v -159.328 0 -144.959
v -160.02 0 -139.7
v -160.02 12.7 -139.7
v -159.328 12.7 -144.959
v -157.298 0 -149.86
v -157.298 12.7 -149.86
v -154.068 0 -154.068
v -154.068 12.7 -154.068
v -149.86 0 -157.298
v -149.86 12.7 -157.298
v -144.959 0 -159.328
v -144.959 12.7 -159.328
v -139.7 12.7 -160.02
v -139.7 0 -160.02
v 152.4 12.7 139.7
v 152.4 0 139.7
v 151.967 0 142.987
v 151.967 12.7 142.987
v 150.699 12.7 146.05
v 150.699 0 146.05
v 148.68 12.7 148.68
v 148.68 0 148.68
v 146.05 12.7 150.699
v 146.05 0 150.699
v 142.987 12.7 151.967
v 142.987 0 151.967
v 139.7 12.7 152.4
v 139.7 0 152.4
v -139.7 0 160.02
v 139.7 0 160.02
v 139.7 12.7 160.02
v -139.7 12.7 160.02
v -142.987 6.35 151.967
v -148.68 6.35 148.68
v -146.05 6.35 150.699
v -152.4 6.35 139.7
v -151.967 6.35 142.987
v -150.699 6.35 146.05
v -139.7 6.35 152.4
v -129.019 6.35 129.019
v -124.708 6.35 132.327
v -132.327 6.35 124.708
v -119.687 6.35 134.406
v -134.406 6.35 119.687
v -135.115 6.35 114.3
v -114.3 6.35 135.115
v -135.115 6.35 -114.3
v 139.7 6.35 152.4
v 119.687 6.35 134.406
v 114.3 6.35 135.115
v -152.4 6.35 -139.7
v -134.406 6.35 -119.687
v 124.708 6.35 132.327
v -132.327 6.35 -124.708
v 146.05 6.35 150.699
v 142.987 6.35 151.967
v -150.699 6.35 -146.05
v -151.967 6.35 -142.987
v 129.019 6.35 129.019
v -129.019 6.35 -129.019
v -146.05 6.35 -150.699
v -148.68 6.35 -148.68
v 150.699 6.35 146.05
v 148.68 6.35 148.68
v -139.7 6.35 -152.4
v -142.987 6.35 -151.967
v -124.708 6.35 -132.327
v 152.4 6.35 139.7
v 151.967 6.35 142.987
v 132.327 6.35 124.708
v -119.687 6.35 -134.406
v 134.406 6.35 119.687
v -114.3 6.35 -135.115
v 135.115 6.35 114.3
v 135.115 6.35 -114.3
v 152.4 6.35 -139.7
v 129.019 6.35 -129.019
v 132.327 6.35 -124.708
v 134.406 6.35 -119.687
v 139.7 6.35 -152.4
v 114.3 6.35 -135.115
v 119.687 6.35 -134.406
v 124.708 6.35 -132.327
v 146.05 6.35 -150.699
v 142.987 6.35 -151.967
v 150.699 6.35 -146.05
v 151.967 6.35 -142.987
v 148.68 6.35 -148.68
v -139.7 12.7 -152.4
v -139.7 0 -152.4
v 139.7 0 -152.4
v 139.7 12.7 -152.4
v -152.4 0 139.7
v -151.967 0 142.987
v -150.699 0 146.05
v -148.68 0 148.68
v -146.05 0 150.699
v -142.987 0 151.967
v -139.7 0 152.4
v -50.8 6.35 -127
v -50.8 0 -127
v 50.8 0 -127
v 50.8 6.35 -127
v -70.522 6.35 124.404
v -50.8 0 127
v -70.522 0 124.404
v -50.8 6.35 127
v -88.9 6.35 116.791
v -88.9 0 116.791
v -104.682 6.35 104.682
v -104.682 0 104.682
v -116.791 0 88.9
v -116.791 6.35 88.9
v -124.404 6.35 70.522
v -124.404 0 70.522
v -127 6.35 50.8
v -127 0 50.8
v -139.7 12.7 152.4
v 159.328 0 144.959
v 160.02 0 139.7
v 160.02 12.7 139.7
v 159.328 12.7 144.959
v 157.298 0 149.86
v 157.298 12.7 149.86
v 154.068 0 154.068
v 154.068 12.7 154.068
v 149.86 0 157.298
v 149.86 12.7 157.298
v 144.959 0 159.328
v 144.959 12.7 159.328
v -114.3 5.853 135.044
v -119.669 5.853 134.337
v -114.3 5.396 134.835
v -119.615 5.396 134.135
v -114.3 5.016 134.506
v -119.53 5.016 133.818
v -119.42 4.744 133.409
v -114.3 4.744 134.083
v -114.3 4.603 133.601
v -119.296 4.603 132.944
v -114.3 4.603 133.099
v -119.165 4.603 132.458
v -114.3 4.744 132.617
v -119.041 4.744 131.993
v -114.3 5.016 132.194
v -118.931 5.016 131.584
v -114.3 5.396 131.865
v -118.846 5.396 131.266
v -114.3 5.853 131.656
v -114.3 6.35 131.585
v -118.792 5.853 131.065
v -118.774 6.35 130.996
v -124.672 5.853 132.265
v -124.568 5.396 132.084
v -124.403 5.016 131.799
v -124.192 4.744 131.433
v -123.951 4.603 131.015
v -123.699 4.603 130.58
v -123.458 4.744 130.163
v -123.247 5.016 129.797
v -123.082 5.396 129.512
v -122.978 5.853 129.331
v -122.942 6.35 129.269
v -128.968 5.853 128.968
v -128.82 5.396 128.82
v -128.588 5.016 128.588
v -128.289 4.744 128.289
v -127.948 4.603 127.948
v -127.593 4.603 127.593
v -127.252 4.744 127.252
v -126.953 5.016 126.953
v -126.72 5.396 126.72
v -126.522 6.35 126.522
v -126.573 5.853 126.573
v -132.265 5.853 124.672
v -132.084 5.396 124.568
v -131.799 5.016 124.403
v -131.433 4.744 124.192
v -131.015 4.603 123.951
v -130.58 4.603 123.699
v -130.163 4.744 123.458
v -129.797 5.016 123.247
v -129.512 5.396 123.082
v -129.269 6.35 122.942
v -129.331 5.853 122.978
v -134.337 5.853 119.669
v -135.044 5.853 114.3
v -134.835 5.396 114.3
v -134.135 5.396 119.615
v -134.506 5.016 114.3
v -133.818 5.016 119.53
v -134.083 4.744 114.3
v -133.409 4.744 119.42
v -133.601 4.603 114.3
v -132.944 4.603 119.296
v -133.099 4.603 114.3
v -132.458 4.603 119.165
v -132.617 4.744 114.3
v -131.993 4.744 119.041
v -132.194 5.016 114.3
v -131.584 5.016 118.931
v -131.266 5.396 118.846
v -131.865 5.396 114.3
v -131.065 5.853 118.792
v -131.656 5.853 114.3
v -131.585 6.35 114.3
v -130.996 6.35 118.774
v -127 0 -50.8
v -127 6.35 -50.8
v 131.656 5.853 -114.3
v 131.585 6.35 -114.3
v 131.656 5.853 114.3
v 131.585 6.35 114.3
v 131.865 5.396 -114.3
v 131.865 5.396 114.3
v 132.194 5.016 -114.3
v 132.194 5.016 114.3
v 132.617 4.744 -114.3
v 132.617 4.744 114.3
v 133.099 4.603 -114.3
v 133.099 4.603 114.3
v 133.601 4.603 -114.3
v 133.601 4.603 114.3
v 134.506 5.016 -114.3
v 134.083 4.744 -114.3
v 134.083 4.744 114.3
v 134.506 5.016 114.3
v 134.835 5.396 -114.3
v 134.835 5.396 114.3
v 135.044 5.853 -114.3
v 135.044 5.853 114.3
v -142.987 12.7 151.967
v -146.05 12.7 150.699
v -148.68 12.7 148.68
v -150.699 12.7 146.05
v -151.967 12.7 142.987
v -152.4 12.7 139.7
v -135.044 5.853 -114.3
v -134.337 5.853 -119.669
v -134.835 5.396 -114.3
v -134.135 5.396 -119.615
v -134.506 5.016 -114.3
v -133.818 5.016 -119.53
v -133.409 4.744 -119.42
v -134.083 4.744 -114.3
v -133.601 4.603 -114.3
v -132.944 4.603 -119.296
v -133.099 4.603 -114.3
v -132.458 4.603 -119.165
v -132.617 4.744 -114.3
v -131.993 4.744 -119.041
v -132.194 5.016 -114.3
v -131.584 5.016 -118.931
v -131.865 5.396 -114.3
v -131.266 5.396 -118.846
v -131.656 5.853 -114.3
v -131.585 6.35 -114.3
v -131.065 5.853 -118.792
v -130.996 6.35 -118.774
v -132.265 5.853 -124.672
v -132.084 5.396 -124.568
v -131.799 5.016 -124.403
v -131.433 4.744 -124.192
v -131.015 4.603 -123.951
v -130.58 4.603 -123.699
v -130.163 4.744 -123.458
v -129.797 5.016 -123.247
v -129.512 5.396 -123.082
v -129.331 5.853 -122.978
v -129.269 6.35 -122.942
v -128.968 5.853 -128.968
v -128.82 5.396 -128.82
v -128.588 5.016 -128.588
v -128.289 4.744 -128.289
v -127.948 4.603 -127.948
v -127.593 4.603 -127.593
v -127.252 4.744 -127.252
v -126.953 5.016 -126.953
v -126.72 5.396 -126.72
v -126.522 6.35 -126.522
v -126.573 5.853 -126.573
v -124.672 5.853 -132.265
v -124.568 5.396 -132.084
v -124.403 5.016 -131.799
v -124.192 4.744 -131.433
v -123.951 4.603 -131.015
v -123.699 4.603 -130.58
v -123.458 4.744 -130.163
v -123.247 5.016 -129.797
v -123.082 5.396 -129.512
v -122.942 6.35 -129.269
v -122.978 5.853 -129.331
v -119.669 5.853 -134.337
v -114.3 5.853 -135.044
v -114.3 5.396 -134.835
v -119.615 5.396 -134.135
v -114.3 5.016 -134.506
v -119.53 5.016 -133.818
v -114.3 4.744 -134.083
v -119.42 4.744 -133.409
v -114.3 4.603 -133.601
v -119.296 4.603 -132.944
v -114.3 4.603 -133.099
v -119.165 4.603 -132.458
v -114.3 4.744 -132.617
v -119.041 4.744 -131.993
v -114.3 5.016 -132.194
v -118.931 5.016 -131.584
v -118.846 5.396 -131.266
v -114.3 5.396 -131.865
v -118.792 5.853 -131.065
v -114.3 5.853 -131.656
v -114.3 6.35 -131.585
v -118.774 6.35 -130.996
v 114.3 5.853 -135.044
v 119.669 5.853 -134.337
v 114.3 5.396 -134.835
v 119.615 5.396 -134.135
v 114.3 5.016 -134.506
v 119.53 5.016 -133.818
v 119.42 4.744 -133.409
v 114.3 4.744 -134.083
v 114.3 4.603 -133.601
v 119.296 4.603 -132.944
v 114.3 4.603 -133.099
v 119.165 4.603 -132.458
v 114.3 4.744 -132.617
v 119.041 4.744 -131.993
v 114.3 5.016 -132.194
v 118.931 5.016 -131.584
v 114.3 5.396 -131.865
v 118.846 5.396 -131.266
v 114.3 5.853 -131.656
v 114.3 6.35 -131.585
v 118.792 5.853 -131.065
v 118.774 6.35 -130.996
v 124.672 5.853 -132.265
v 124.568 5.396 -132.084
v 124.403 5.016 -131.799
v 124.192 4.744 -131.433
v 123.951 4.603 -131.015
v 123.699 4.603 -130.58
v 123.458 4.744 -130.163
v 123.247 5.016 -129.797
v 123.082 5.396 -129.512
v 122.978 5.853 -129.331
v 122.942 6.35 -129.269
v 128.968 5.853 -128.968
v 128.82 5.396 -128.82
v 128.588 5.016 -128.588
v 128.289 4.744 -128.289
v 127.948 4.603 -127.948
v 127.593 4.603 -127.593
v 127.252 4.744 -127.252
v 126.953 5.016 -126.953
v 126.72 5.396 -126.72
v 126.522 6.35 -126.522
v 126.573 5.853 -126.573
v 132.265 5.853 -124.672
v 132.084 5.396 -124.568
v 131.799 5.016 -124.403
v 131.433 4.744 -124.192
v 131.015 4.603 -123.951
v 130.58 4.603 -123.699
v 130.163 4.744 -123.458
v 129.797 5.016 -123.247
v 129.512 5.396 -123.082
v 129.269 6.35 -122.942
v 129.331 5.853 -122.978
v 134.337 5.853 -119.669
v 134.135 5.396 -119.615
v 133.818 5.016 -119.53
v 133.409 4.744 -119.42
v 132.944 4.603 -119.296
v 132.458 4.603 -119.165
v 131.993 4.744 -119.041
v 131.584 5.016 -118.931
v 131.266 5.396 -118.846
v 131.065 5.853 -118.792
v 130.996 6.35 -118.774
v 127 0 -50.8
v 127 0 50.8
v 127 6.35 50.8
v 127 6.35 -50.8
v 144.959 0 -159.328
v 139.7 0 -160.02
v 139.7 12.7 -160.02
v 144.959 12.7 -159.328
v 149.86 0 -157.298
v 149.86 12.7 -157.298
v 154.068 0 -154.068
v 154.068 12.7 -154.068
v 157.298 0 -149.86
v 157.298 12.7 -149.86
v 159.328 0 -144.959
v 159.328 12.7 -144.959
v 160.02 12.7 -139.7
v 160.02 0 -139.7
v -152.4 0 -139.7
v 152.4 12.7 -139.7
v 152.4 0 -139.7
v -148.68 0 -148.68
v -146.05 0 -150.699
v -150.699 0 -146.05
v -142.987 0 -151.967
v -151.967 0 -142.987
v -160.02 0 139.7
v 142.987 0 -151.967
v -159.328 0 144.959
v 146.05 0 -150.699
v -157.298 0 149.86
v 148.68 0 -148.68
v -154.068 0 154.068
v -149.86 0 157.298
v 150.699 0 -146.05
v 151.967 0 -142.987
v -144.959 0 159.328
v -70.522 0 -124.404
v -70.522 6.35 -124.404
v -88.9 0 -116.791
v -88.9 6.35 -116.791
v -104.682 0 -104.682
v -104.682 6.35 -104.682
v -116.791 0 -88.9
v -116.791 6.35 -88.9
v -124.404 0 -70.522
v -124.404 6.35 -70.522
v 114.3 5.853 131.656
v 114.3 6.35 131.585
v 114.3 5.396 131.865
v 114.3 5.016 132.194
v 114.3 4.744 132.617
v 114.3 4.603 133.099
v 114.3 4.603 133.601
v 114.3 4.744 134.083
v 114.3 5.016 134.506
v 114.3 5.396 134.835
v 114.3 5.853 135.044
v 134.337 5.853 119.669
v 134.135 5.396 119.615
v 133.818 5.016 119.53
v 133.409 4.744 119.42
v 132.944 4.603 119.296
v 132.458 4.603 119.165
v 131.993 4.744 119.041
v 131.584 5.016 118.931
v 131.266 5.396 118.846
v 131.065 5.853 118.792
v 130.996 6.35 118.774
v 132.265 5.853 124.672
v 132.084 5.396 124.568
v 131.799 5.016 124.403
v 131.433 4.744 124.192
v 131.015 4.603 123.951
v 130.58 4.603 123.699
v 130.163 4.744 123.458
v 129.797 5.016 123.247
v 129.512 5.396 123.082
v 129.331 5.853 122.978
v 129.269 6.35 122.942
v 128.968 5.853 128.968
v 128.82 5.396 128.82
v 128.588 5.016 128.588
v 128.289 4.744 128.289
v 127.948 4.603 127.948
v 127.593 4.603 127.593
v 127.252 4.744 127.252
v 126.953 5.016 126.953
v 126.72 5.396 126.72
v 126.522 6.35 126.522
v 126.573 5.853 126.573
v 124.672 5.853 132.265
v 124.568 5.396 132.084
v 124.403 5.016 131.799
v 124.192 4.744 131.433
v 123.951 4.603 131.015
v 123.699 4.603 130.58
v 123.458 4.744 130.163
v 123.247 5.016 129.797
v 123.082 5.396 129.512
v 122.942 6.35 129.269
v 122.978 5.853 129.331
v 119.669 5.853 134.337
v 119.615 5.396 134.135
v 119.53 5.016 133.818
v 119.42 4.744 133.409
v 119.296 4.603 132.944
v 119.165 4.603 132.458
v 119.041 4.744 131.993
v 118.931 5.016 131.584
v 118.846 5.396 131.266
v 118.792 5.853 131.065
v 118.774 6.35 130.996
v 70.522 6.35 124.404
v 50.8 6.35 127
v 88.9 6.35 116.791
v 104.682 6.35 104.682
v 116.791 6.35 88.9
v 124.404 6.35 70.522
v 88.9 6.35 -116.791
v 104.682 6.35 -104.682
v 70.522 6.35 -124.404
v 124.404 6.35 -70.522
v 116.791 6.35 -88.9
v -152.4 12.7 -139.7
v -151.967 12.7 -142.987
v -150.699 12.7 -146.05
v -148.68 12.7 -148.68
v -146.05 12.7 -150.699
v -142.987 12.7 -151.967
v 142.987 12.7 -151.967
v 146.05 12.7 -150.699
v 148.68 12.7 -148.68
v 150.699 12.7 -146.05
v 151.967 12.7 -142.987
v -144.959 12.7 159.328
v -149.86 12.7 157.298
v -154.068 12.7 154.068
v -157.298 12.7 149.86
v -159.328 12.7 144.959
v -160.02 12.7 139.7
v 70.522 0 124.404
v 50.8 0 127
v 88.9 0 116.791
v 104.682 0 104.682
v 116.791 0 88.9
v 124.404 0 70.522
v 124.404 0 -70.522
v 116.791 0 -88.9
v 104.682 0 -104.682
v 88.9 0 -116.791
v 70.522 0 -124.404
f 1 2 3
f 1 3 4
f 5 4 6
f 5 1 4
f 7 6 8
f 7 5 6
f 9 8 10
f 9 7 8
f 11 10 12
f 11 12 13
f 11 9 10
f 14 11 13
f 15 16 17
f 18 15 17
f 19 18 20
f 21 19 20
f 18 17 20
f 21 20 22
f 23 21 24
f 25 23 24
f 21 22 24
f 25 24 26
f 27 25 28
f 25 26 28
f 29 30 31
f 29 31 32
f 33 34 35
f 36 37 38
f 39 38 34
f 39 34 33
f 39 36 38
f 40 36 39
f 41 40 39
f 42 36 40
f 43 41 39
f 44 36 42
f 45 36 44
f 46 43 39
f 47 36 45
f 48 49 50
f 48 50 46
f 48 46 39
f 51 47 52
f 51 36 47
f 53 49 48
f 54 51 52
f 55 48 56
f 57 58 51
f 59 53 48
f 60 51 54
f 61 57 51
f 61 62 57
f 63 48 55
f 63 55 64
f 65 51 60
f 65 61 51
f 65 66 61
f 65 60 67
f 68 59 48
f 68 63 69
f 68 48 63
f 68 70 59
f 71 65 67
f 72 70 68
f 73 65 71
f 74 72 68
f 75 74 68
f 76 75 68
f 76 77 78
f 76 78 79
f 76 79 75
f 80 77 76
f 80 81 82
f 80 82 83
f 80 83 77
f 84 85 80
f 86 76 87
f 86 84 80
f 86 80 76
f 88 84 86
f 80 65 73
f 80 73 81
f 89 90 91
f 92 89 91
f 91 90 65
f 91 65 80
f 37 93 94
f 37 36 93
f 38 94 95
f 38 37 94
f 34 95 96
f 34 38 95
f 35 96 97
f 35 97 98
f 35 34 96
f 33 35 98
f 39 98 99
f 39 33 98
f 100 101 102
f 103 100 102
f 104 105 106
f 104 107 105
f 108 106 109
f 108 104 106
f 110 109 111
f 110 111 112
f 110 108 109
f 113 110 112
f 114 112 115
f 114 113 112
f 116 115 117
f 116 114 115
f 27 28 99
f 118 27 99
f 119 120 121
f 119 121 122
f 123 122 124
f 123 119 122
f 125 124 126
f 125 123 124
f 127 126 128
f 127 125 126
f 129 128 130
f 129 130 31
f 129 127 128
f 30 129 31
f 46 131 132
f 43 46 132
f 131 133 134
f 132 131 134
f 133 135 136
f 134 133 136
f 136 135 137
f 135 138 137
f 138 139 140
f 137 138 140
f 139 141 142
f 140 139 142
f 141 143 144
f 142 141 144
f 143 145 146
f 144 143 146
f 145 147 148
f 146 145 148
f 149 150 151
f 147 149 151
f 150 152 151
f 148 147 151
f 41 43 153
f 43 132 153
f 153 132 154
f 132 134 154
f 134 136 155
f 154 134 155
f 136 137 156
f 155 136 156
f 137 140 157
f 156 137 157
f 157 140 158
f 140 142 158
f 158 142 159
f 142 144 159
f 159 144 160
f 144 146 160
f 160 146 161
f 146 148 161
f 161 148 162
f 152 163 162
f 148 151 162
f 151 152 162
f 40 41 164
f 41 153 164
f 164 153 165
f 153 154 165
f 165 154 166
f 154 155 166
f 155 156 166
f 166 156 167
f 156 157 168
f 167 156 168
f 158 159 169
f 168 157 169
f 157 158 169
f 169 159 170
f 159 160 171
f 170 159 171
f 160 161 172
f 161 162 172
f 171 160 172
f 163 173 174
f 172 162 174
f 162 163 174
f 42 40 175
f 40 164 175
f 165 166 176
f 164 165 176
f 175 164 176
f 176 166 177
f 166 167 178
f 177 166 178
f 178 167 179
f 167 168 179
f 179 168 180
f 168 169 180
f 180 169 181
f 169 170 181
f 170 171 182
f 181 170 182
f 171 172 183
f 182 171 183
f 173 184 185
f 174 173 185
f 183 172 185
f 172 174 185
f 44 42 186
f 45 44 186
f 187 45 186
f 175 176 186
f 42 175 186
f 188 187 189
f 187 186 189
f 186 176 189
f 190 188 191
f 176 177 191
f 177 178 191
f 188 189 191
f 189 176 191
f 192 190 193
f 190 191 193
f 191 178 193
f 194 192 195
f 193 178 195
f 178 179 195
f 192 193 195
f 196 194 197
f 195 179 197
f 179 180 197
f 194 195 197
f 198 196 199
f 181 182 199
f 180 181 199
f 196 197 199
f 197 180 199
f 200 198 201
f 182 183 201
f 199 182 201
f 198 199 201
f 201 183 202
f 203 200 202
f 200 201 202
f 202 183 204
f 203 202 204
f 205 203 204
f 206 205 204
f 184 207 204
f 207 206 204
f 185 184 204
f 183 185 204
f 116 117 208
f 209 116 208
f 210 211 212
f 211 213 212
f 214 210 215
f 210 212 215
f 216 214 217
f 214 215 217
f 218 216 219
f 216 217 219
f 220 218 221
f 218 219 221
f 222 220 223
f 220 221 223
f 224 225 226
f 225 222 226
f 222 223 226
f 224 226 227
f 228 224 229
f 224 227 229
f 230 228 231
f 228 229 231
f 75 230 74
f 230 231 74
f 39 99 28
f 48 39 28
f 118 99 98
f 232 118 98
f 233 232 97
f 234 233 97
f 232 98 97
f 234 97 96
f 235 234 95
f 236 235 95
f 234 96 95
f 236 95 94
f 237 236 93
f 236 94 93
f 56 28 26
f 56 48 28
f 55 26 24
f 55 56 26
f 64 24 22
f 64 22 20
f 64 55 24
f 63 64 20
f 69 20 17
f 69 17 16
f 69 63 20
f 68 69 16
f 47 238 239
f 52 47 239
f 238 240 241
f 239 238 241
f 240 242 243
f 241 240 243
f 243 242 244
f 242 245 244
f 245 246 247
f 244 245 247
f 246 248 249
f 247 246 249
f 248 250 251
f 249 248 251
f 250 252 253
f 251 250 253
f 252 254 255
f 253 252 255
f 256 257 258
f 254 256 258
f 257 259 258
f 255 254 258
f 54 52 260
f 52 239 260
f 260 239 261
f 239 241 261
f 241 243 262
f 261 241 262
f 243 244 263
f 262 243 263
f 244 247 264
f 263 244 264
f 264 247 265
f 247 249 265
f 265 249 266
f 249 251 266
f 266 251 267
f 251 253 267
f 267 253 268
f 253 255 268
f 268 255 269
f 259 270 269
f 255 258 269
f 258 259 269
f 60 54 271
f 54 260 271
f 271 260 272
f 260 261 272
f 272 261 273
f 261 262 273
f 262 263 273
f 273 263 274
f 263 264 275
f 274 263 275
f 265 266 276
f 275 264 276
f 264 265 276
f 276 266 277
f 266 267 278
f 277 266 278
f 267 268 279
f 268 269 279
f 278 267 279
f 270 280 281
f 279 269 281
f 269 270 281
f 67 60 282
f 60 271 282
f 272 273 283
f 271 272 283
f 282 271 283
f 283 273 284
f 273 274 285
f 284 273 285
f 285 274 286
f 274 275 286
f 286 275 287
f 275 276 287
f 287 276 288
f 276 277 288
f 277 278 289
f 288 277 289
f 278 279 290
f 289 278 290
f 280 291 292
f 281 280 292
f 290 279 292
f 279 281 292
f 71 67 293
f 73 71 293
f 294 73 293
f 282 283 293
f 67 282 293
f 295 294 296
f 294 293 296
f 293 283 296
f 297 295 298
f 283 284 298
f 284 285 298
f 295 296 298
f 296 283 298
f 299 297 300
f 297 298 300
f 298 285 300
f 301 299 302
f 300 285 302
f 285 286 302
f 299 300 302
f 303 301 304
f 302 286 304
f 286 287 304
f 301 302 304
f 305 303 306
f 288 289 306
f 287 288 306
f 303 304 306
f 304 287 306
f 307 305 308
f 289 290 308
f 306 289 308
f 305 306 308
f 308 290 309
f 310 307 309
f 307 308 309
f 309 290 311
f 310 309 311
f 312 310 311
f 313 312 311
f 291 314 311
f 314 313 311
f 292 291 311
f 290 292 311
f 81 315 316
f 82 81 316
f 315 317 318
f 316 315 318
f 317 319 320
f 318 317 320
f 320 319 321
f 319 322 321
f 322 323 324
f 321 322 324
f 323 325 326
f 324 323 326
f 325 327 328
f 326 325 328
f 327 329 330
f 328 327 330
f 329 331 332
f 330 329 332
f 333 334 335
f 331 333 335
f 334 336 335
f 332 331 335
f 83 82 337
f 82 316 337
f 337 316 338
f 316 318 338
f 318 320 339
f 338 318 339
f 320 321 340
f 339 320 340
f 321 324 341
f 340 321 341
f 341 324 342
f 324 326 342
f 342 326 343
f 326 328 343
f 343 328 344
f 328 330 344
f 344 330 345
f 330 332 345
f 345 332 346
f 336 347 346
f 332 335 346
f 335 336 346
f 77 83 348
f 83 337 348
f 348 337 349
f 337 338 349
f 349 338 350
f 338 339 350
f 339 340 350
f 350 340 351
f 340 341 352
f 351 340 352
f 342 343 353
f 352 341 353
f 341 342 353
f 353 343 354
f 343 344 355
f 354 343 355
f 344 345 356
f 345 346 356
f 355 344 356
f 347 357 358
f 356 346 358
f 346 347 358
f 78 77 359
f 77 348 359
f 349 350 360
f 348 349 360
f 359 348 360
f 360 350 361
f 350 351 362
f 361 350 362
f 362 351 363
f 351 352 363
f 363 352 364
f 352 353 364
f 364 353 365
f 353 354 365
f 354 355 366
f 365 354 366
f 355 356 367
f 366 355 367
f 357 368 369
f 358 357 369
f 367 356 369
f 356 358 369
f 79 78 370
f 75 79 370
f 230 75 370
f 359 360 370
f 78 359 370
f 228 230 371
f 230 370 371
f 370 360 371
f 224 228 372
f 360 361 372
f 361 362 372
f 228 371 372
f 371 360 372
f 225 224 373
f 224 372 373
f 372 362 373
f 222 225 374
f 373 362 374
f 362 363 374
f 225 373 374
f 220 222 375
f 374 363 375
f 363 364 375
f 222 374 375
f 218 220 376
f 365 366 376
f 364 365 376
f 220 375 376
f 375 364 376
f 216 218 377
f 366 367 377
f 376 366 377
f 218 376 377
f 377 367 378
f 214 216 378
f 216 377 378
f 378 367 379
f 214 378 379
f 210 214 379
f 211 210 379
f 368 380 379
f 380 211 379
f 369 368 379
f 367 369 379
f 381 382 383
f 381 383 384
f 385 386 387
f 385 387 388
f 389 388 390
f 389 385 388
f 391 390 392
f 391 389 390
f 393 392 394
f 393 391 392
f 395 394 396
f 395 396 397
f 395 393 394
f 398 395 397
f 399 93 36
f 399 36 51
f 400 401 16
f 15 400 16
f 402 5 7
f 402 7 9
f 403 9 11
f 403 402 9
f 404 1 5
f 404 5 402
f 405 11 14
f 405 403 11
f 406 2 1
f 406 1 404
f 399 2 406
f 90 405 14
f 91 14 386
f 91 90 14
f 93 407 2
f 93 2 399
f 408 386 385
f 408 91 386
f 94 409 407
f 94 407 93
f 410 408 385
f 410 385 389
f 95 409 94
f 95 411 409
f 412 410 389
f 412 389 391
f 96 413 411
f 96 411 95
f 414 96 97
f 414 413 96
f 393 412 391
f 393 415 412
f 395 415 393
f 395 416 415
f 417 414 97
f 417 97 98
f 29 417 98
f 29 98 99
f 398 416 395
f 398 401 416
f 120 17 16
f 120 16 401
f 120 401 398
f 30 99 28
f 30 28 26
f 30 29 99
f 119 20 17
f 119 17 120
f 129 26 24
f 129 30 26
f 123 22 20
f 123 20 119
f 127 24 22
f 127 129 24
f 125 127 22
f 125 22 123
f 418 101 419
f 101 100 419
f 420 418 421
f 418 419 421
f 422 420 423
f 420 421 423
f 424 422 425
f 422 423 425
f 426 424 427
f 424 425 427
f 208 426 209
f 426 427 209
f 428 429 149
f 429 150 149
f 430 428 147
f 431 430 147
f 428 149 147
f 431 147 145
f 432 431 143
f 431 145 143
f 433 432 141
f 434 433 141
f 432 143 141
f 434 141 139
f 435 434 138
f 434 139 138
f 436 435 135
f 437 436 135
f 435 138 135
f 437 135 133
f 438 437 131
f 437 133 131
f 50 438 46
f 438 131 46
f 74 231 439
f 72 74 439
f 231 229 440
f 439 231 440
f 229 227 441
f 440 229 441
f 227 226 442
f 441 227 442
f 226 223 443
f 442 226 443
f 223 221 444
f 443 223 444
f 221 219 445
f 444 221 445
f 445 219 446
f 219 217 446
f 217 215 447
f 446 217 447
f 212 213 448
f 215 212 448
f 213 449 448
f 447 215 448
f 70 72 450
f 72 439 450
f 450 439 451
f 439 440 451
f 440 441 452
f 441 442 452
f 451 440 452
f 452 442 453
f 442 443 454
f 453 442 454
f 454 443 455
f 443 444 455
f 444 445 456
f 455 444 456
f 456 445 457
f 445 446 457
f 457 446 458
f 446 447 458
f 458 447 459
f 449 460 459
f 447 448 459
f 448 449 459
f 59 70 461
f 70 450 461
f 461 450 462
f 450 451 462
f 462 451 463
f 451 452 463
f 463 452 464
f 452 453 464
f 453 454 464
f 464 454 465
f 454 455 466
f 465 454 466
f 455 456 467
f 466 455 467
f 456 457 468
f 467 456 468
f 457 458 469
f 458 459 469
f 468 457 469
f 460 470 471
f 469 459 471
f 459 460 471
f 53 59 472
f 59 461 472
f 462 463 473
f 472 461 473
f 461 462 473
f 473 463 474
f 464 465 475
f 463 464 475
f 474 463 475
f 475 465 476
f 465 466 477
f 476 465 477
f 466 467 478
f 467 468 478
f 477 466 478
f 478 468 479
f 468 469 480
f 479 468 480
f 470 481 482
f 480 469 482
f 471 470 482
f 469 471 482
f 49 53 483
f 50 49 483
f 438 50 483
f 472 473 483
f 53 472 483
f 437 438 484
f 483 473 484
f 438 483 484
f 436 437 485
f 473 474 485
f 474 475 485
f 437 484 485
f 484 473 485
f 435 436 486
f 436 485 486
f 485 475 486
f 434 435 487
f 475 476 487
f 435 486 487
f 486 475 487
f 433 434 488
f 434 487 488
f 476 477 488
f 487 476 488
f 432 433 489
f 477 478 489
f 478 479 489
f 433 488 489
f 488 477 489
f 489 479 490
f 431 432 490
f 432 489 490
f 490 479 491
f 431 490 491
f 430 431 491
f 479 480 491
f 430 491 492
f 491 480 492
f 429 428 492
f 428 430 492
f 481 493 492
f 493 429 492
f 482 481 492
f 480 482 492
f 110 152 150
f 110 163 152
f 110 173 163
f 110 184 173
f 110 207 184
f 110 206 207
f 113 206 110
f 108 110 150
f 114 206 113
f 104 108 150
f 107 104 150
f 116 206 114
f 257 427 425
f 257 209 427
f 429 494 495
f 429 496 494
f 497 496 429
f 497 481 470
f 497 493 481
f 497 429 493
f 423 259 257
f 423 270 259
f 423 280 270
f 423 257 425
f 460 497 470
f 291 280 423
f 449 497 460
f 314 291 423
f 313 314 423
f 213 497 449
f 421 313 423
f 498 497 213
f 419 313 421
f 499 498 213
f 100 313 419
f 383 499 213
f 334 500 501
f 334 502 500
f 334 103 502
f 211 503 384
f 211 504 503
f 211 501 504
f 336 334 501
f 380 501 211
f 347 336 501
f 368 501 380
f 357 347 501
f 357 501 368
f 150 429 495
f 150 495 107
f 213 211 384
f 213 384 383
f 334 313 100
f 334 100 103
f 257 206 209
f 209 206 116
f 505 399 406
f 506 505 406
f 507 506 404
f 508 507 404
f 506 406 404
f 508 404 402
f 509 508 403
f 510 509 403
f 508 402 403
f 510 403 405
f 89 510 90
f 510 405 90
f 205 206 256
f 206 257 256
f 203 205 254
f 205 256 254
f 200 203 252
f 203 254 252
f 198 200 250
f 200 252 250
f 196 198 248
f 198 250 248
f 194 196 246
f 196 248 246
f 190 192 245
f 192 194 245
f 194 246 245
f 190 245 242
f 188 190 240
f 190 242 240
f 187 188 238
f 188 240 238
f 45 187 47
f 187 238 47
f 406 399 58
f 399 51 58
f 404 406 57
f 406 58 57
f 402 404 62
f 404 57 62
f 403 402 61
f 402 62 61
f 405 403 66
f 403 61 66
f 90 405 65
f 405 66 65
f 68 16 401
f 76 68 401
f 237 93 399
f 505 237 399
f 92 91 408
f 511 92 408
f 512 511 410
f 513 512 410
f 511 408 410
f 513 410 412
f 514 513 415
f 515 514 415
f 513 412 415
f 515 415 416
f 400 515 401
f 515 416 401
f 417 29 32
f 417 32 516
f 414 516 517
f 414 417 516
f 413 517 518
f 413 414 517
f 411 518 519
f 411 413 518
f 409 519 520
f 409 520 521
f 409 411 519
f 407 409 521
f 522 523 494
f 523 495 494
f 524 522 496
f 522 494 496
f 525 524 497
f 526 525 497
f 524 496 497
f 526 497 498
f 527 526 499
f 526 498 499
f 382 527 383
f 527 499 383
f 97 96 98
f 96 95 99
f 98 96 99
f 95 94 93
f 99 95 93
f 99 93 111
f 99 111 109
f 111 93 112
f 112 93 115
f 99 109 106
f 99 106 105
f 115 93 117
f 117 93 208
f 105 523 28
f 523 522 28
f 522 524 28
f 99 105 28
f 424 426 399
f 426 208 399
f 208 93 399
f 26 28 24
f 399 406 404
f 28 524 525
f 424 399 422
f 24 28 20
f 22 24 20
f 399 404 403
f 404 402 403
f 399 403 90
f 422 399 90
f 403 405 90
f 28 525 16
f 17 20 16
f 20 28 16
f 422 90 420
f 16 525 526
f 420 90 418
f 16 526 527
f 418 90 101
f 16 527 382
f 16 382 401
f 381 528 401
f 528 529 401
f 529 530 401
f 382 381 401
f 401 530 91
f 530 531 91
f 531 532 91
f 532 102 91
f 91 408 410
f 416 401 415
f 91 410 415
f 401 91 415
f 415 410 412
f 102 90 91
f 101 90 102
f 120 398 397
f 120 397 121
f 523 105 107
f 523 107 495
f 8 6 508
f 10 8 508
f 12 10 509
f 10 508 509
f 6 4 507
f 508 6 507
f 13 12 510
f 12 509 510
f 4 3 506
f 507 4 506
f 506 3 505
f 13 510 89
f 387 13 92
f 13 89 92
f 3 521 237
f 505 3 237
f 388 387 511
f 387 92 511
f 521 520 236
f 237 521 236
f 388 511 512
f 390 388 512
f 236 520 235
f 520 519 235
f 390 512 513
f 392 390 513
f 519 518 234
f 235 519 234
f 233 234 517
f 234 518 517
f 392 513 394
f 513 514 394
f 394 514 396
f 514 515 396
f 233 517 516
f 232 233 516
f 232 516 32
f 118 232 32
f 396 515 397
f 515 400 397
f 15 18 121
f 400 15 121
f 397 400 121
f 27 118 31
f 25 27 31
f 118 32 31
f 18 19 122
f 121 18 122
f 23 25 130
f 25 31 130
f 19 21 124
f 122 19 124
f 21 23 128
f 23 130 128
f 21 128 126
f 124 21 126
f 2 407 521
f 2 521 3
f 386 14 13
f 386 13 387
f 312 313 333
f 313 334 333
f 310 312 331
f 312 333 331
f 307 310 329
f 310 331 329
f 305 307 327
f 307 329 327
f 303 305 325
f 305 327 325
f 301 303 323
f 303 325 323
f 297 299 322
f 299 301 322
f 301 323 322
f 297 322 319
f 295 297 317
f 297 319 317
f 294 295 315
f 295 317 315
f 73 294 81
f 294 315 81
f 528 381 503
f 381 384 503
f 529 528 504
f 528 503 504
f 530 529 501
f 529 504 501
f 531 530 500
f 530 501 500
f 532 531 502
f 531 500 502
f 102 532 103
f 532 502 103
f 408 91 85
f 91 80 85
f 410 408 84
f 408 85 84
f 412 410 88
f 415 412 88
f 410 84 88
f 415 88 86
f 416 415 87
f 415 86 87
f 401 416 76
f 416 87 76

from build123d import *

# Parameters (mm, degrees)
SKETCH1_W           = 304.8
SKETCH1_H           = 304.8
SKETCH1_W_2         = 254
SKETCH1_H_2         = 254
BOSS_EXTRUDE1_DEPTH = 6.35
FILLET1_R           = 76.2
FILLET2_R           = 12.7
SKETCH4_R           = 1.7653
BOSS_EXTRUDE2_DEPTH = 12.7


with BuildPart() as part:
    # Sketch1 → Boss-Extrude1 (new body)
    with BuildSketch(Plane(origin=(0, 0, 0), x_dir=(1, 0, 0), z_dir=(0, 1, 0))):
        Rectangle(SKETCH1_W, SKETCH1_H)
        Rectangle(SKETCH1_W_2, SKETCH1_H_2, mode=Mode.SUBTRACT)
    extrude(amount=BOSS_EXTRUDE1_DEPTH)

    # Fillet1
    fillet1_edges = [part.edges().sort_by_distance(p)[0] for p in [
        (-127, 3.175, -127),
        (-127, 3.175, 127),
        (127, 3.175, 127),
        (127, 3.175, -127),
    ]]
    fillet(fillet1_edges, radius=FILLET1_R)

    # Fillet2
    fillet2_edges = [part.edges().sort_by_distance(p)[0] for p in [
        (152.4, 3.175, 152.4),
        (-152.4, 3.175, 152.4),
        (-152.4, 3.175, -152.4),
        (152.4, 3.175, -152.4),
    ]]
    fillet(fillet2_edges, radius=FILLET2_R)

    # Cut-Sweep1: sweep along a path in Sketch3
    with BuildLine(Plane(origin=(0, 6.35, 0), x_dir=(1, 0, 0), z_dir=(0, 1, 0))) as cut_sweep1_path:
        Line((114.3, -133.35), (-114.3, -133.35))
        ThreePointArc((-114.3, -133.35), (-127.770384182, -127.770384182), (-133.35, -114.3))
        Line((-133.35, -114.3), (-133.35, 114.3))
        ThreePointArc((-133.35, 114.3), (-127.770384182, 127.770384182), (-114.3, 133.35))
        Line((-114.3, 133.35), (114.3, 133.35))
        ThreePointArc((114.3, 133.35), (127.770384182, 127.770384182), (133.35, 114.3))
        Line((133.35, 114.3), (133.35, -114.3))
        ThreePointArc((133.35, -114.3), (127.770384182, -127.770384182), (114.3, -133.35))
    # Sketch4 → Cut-Sweep1 (sweep, cut)
    with BuildSketch(Plane(origin=(0, 0, 0), x_dir=(0, 0, -1), z_dir=(1, 0, 0))):
        with Locations((133.35, 6.35)):
            Circle(SKETCH4_R)
    sweep(path=cut_sweep1_path.line, mode=Mode.SUBTRACT)


with BuildPart() as body_2:
    # Sketch5 → Boss-Extrude2 (new body)
    with BuildSketch(Plane.XZ):
        with BuildLine():
            Line((139.7, 160.02), (-139.7, 160.02))
            ThreePointArc((-139.7, 160.02), (-154.068409794, 154.068409794), (-160.02, 139.7))
            Line((-160.02, 139.7), (-160.02, -139.7))
            ThreePointArc((-160.02, -139.7), (-154.068409794, -154.068409794), (-139.7, -160.02))
            Line((-139.7, -160.02), (139.7, -160.02))
            ThreePointArc((139.7, -160.02), (154.068409794, -154.068409794), (160.02, -139.7))
            Line((160.02, -139.7), (160.02, 139.7))
            ThreePointArc((160.02, 139.7), (154.068409794, 154.068409794), (139.7, 160.02))
        make_face()
        with BuildLine():
            Line((139.7, 152.4), (-139.7, 152.4))
            ThreePointArc((-139.7, 152.4), (-148.680256121, 148.680256121), (-152.4, 139.7))
            Line((-152.4, 139.7), (-152.4, -139.7))
            ThreePointArc((-152.4, -139.7), (-148.680256121, -148.680256121), (-139.7, -152.4))
            Line((-139.7, -152.4), (139.7, -152.4))
            ThreePointArc((139.7, -152.4), (148.680256121, -148.680256121), (152.4, -139.7))
            Line((152.4, -139.7), (152.4, 139.7))
            ThreePointArc((152.4, 139.7), (148.680256121, 148.680256121), (139.7, 152.4))
        make_face(mode=Mode.SUBTRACT)
    extrude(amount=-BOSS_EXTRUDE2_DEPTH)


solid = Compound([part.part, body_2.part])
